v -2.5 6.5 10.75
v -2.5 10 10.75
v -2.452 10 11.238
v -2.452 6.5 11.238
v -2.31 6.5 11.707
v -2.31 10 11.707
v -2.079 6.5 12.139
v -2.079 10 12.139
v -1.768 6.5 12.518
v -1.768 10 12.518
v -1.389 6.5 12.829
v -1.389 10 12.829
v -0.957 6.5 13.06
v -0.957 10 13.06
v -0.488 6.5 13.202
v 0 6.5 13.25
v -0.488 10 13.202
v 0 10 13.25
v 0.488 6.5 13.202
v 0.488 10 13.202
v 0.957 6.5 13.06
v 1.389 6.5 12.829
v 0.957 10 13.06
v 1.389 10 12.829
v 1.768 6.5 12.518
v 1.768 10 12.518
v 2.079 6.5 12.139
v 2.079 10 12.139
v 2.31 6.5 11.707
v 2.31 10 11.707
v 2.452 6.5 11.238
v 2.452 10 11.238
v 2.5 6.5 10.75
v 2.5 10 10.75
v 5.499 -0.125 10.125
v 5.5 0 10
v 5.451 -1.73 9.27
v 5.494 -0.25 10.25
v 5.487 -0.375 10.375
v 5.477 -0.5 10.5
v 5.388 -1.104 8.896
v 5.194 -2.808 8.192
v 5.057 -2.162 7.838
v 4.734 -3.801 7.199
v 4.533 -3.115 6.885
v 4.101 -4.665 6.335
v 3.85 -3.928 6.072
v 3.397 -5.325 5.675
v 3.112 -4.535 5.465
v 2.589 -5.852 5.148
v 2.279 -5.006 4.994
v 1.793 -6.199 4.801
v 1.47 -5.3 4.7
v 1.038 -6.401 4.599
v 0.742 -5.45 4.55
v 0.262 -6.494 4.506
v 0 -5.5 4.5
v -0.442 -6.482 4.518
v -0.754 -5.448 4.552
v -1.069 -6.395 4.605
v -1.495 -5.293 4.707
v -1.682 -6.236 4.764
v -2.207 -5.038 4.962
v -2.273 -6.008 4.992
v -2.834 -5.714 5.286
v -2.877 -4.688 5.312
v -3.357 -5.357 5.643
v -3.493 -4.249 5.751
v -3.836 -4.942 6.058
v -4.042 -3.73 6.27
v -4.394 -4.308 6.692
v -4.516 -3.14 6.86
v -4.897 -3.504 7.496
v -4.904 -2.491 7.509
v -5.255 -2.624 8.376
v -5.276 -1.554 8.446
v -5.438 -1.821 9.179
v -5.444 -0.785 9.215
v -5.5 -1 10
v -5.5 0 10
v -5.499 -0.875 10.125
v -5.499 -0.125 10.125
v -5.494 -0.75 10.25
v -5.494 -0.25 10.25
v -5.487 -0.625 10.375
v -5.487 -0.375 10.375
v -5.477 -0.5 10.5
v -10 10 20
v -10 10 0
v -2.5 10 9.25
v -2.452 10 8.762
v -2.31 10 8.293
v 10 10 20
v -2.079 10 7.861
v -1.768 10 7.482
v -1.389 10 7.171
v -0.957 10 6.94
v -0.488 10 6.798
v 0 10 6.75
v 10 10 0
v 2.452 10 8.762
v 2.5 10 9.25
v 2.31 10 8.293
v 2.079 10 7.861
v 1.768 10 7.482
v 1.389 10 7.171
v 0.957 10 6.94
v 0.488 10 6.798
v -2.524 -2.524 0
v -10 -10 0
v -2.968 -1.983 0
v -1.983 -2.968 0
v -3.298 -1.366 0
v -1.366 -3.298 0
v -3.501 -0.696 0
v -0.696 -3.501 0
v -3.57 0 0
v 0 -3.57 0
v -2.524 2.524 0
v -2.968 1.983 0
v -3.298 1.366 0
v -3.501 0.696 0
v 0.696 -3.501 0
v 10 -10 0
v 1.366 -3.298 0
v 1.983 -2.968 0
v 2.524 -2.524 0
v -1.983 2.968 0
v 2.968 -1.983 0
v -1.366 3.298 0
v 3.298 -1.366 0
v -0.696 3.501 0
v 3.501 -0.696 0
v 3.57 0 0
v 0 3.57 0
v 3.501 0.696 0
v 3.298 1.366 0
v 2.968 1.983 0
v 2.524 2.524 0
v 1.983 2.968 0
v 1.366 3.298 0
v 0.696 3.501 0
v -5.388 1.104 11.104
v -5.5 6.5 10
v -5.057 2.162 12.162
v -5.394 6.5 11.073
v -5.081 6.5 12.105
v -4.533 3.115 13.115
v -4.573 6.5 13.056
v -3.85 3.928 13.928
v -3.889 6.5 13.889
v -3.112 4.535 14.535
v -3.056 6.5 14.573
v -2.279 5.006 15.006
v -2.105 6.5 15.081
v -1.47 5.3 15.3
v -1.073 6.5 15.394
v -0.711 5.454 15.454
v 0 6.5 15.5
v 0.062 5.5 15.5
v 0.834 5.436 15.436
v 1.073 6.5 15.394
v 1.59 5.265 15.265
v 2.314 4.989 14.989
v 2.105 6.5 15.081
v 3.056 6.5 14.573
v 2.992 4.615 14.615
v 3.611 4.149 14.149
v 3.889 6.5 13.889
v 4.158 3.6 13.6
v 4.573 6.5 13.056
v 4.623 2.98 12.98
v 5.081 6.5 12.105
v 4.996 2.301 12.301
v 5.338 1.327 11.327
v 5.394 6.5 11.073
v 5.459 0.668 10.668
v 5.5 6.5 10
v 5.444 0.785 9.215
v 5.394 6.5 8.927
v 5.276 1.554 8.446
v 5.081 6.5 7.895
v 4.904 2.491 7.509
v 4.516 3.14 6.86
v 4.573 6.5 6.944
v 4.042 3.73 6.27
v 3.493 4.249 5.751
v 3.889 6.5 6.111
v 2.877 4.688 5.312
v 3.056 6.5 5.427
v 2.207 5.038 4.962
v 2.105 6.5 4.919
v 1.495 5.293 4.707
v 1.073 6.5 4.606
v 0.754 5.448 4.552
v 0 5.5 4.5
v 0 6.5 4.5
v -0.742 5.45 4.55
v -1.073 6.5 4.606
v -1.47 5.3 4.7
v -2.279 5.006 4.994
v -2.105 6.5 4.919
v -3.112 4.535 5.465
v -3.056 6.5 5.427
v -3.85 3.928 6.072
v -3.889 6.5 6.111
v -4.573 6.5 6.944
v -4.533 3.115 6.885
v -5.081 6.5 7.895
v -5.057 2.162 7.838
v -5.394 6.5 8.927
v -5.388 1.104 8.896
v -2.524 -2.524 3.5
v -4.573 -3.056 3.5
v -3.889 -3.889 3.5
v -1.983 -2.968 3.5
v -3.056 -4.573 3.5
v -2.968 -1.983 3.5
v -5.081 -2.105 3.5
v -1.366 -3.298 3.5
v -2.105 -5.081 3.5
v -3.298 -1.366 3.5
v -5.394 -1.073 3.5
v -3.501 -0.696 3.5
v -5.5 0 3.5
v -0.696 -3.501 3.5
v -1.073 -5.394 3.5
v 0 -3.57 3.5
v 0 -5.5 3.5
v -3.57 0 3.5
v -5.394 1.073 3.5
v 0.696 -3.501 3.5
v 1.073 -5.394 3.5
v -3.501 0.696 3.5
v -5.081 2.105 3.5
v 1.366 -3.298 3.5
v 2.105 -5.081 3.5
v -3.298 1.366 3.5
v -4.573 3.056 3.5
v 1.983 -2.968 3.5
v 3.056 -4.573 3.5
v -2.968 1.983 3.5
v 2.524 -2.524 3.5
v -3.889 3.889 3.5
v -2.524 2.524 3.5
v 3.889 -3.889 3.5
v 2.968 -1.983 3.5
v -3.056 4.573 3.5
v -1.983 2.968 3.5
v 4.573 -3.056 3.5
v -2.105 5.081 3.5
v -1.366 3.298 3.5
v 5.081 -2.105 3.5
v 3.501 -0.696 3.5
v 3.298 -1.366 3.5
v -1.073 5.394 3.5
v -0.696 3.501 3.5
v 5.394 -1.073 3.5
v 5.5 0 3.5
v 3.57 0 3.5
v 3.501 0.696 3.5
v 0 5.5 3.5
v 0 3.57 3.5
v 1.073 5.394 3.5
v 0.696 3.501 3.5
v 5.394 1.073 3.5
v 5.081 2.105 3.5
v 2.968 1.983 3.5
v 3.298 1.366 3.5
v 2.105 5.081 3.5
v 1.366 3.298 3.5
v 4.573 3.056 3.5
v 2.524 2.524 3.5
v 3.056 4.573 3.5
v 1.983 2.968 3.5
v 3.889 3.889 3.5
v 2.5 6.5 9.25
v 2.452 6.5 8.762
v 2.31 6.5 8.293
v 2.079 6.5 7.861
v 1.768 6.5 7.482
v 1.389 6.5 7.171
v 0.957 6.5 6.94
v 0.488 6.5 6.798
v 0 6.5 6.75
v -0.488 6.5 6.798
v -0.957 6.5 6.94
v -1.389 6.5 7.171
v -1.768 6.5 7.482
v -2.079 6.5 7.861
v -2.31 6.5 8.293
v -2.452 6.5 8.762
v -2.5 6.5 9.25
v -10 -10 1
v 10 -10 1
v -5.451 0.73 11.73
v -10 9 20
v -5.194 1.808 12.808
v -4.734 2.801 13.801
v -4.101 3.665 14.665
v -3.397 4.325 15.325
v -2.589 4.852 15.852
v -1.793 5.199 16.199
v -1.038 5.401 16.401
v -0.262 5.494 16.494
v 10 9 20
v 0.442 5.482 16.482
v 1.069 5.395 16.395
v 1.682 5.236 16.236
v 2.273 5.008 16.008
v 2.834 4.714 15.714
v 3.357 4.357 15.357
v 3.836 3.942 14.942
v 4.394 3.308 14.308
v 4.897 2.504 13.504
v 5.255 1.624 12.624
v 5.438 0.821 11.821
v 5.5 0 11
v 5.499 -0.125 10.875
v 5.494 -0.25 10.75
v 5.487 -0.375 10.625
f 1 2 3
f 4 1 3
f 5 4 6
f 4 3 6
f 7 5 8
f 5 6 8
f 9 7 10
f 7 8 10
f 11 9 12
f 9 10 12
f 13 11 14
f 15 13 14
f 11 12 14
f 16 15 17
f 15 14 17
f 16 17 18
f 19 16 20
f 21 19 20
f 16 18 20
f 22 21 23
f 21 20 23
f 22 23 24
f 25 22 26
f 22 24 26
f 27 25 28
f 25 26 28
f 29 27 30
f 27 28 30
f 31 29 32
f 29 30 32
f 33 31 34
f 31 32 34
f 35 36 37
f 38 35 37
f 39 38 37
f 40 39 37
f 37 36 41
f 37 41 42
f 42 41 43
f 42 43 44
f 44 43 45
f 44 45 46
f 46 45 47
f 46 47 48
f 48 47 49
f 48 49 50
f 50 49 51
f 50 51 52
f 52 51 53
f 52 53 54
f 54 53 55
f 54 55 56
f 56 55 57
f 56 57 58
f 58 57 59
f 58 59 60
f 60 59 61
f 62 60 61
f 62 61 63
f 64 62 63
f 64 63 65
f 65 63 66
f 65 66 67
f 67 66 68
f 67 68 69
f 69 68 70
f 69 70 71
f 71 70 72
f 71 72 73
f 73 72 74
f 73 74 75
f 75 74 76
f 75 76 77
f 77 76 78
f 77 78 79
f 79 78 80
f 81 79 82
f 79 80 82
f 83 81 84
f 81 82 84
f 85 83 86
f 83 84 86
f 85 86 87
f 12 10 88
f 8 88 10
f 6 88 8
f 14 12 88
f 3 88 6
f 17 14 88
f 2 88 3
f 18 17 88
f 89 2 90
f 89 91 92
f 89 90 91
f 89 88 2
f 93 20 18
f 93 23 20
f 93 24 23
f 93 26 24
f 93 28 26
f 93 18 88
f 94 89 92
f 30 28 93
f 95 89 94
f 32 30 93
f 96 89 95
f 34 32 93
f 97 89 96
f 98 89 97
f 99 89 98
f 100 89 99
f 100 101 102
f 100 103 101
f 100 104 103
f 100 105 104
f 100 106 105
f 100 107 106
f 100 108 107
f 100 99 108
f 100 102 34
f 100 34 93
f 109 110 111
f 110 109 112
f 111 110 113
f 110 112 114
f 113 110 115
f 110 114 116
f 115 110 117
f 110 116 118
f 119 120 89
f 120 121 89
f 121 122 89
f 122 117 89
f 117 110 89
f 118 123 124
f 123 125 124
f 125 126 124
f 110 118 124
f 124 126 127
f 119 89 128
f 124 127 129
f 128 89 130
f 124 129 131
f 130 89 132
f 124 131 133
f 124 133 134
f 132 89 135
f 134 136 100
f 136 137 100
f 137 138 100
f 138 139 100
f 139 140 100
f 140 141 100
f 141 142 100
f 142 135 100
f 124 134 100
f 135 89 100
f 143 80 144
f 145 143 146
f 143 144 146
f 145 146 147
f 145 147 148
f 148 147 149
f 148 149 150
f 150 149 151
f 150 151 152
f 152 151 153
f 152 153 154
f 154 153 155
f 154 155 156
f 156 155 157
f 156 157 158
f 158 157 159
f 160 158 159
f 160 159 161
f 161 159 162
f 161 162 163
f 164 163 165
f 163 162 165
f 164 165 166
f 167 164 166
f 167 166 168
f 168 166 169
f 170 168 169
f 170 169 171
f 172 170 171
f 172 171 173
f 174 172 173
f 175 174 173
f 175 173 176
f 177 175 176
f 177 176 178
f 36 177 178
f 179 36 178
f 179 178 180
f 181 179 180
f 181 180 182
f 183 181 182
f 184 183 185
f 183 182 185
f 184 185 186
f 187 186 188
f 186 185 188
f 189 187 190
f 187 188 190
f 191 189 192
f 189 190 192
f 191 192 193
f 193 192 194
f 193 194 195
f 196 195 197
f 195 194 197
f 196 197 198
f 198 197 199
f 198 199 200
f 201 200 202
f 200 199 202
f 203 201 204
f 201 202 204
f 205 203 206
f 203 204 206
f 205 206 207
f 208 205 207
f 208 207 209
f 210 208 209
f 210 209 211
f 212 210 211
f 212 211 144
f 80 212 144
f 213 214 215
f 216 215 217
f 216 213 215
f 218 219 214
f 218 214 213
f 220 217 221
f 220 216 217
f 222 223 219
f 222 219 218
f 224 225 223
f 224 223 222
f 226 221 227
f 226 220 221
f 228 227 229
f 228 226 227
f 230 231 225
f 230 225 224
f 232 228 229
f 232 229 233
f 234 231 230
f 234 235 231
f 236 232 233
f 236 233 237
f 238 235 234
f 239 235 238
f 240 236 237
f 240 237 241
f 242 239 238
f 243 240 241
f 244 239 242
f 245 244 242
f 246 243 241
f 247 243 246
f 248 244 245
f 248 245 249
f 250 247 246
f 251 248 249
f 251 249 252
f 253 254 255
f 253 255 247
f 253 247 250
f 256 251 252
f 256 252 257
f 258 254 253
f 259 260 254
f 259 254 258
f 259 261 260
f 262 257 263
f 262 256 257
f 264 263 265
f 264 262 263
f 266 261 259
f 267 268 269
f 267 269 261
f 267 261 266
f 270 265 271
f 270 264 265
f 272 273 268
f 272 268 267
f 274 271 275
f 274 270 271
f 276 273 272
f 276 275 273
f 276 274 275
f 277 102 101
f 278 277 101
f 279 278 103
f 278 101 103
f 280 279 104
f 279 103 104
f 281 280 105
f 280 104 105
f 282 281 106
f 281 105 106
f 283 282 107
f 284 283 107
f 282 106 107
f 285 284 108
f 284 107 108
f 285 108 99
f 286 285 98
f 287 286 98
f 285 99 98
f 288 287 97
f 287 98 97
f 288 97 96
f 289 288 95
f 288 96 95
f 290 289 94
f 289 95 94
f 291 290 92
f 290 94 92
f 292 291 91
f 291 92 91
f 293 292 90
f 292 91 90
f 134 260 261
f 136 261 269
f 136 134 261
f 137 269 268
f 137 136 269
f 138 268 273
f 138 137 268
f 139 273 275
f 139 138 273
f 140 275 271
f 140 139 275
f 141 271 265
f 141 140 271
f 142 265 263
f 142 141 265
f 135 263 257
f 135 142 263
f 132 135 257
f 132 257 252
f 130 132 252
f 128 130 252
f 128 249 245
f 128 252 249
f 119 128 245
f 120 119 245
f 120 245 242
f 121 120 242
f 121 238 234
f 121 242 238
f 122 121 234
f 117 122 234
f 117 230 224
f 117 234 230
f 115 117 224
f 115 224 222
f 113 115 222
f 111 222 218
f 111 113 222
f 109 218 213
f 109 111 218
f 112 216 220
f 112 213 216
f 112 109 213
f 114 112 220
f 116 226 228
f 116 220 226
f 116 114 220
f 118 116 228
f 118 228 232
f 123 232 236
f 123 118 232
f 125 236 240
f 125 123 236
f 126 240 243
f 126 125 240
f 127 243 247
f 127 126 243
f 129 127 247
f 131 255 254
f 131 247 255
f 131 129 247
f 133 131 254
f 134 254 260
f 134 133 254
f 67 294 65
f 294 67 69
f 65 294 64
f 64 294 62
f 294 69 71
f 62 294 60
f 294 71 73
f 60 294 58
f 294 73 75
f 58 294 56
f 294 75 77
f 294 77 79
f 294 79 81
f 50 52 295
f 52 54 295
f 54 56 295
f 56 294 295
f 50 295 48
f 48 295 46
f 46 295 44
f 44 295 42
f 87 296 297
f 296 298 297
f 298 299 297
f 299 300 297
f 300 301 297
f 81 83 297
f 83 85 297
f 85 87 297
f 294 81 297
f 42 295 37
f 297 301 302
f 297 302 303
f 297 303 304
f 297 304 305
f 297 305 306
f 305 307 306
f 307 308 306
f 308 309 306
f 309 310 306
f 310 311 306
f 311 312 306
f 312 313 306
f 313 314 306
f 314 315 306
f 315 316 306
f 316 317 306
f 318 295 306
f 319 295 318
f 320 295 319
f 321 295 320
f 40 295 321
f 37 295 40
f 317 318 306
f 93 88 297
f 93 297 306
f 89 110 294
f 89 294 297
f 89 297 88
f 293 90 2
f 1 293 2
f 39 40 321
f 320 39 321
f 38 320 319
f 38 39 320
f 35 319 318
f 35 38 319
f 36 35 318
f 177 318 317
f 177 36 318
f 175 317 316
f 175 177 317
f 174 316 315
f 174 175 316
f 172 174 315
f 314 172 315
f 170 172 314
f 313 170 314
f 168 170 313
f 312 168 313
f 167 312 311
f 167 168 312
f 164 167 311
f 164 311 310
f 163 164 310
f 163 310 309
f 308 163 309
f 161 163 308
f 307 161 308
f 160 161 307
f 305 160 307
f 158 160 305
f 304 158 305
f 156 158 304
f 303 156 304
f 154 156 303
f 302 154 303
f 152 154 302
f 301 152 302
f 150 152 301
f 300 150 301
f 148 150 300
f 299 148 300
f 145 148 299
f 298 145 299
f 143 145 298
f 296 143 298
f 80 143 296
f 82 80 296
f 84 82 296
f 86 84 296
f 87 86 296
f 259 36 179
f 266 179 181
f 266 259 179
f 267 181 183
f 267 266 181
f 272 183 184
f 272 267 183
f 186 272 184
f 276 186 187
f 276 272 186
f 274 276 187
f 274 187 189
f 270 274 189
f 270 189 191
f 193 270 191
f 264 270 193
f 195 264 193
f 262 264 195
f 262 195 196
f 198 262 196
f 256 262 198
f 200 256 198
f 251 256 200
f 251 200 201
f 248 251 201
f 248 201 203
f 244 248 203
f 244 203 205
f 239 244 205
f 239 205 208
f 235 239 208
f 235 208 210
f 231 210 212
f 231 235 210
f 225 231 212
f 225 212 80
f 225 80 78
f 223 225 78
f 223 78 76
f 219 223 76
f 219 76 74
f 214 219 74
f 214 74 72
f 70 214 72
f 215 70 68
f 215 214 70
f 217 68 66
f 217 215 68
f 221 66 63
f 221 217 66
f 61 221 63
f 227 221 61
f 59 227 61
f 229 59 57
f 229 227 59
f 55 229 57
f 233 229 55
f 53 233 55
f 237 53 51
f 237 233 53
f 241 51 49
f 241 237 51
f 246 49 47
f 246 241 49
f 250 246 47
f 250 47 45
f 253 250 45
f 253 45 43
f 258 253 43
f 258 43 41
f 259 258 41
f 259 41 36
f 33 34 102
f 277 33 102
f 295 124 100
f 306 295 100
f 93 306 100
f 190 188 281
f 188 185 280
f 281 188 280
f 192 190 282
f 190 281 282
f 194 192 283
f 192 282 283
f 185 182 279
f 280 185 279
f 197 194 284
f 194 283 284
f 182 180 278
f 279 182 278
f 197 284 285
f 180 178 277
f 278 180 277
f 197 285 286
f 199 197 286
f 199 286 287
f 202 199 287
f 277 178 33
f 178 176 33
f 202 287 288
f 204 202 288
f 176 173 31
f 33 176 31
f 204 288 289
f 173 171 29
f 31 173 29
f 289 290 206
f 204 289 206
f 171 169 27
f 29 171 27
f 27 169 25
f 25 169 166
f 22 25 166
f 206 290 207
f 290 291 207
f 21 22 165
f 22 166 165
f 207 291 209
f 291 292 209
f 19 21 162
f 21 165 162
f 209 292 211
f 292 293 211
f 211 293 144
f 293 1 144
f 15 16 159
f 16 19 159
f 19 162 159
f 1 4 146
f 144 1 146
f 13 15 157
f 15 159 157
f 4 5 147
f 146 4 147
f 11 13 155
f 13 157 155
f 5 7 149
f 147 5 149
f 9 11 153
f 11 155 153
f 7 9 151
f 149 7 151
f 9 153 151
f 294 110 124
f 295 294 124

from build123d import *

# Parameters (mm, degrees)
F0_W      = 20
F0_H      = 20
F1_DEPTH  = 20
F2_R      = 3.57
F3_DEPTH  = 20.001
F5_R      = 5.5
F6_DEPTH  = 16.5
F8_DEPTH  = 20.001
F10_R     = 5.5
F11_DEPTH = 16.5
F13_DEPTH = 12.5


with BuildPart() as f1:
    # F0 (on Top) → F1 (new body)
    with BuildSketch(Plane.XY):
        Rectangle(F0_W, F0_H)
    extrude(amount=F1_DEPTH)

    # F2 (on Top) → F3 (cut, through all)
    with BuildSketch(Plane.XY):
        Circle(F2_R)
    extrude(amount=F3_DEPTH, mode=Mode.SUBTRACT)

    # F5 (on offset) → F6 (cut, through all)
    with BuildSketch(Plane.XY.offset(3.5)):
        Circle(F5_R)
    extrude(amount=F6_DEPTH, mode=Mode.SUBTRACT)

    # F7 (on face) → F8 (cut, through all)
    with BuildSketch(Plane(origin=(0, 10, 0), x_dir=(-1, 0, 0), z_dir=(0, 1, 0))):
        with BuildLine():
            Line((2.5, 9.25), (2.5, 10.75))
            ThreePointArc((2.5, 10.75), (0, 13.25), (-2.5, 10.75))
            Line((-2.5, 10.75), (-2.5, 9.25))
            ThreePointArc((-2.5, 9.25), (0, 6.75), (2.5, 9.25))
        make_face()
    extrude(amount=-F8_DEPTH, mode=Mode.SUBTRACT)

    # F10 (on offset) → F11 (cut, through all)
    with BuildSketch(Plane(origin=(0, 6.5, 0), x_dir=(-1, 0, 0), z_dir=(0, 1, 0))):
        with Locations((0, 10)):
            Circle(F10_R)
    extrude(amount=-F11_DEPTH, mode=Mode.SUBTRACT)

    # F12 (on Right) → F13 (cut, symmetric)
    with BuildSketch(Plane.YZ):
        Polygon((-10, 20), (-10, 1), (9, 20), align=None)
    extrude(amount=F13_DEPTH, both=True, mode=Mode.SUBTRACT)


solid = f1.part
